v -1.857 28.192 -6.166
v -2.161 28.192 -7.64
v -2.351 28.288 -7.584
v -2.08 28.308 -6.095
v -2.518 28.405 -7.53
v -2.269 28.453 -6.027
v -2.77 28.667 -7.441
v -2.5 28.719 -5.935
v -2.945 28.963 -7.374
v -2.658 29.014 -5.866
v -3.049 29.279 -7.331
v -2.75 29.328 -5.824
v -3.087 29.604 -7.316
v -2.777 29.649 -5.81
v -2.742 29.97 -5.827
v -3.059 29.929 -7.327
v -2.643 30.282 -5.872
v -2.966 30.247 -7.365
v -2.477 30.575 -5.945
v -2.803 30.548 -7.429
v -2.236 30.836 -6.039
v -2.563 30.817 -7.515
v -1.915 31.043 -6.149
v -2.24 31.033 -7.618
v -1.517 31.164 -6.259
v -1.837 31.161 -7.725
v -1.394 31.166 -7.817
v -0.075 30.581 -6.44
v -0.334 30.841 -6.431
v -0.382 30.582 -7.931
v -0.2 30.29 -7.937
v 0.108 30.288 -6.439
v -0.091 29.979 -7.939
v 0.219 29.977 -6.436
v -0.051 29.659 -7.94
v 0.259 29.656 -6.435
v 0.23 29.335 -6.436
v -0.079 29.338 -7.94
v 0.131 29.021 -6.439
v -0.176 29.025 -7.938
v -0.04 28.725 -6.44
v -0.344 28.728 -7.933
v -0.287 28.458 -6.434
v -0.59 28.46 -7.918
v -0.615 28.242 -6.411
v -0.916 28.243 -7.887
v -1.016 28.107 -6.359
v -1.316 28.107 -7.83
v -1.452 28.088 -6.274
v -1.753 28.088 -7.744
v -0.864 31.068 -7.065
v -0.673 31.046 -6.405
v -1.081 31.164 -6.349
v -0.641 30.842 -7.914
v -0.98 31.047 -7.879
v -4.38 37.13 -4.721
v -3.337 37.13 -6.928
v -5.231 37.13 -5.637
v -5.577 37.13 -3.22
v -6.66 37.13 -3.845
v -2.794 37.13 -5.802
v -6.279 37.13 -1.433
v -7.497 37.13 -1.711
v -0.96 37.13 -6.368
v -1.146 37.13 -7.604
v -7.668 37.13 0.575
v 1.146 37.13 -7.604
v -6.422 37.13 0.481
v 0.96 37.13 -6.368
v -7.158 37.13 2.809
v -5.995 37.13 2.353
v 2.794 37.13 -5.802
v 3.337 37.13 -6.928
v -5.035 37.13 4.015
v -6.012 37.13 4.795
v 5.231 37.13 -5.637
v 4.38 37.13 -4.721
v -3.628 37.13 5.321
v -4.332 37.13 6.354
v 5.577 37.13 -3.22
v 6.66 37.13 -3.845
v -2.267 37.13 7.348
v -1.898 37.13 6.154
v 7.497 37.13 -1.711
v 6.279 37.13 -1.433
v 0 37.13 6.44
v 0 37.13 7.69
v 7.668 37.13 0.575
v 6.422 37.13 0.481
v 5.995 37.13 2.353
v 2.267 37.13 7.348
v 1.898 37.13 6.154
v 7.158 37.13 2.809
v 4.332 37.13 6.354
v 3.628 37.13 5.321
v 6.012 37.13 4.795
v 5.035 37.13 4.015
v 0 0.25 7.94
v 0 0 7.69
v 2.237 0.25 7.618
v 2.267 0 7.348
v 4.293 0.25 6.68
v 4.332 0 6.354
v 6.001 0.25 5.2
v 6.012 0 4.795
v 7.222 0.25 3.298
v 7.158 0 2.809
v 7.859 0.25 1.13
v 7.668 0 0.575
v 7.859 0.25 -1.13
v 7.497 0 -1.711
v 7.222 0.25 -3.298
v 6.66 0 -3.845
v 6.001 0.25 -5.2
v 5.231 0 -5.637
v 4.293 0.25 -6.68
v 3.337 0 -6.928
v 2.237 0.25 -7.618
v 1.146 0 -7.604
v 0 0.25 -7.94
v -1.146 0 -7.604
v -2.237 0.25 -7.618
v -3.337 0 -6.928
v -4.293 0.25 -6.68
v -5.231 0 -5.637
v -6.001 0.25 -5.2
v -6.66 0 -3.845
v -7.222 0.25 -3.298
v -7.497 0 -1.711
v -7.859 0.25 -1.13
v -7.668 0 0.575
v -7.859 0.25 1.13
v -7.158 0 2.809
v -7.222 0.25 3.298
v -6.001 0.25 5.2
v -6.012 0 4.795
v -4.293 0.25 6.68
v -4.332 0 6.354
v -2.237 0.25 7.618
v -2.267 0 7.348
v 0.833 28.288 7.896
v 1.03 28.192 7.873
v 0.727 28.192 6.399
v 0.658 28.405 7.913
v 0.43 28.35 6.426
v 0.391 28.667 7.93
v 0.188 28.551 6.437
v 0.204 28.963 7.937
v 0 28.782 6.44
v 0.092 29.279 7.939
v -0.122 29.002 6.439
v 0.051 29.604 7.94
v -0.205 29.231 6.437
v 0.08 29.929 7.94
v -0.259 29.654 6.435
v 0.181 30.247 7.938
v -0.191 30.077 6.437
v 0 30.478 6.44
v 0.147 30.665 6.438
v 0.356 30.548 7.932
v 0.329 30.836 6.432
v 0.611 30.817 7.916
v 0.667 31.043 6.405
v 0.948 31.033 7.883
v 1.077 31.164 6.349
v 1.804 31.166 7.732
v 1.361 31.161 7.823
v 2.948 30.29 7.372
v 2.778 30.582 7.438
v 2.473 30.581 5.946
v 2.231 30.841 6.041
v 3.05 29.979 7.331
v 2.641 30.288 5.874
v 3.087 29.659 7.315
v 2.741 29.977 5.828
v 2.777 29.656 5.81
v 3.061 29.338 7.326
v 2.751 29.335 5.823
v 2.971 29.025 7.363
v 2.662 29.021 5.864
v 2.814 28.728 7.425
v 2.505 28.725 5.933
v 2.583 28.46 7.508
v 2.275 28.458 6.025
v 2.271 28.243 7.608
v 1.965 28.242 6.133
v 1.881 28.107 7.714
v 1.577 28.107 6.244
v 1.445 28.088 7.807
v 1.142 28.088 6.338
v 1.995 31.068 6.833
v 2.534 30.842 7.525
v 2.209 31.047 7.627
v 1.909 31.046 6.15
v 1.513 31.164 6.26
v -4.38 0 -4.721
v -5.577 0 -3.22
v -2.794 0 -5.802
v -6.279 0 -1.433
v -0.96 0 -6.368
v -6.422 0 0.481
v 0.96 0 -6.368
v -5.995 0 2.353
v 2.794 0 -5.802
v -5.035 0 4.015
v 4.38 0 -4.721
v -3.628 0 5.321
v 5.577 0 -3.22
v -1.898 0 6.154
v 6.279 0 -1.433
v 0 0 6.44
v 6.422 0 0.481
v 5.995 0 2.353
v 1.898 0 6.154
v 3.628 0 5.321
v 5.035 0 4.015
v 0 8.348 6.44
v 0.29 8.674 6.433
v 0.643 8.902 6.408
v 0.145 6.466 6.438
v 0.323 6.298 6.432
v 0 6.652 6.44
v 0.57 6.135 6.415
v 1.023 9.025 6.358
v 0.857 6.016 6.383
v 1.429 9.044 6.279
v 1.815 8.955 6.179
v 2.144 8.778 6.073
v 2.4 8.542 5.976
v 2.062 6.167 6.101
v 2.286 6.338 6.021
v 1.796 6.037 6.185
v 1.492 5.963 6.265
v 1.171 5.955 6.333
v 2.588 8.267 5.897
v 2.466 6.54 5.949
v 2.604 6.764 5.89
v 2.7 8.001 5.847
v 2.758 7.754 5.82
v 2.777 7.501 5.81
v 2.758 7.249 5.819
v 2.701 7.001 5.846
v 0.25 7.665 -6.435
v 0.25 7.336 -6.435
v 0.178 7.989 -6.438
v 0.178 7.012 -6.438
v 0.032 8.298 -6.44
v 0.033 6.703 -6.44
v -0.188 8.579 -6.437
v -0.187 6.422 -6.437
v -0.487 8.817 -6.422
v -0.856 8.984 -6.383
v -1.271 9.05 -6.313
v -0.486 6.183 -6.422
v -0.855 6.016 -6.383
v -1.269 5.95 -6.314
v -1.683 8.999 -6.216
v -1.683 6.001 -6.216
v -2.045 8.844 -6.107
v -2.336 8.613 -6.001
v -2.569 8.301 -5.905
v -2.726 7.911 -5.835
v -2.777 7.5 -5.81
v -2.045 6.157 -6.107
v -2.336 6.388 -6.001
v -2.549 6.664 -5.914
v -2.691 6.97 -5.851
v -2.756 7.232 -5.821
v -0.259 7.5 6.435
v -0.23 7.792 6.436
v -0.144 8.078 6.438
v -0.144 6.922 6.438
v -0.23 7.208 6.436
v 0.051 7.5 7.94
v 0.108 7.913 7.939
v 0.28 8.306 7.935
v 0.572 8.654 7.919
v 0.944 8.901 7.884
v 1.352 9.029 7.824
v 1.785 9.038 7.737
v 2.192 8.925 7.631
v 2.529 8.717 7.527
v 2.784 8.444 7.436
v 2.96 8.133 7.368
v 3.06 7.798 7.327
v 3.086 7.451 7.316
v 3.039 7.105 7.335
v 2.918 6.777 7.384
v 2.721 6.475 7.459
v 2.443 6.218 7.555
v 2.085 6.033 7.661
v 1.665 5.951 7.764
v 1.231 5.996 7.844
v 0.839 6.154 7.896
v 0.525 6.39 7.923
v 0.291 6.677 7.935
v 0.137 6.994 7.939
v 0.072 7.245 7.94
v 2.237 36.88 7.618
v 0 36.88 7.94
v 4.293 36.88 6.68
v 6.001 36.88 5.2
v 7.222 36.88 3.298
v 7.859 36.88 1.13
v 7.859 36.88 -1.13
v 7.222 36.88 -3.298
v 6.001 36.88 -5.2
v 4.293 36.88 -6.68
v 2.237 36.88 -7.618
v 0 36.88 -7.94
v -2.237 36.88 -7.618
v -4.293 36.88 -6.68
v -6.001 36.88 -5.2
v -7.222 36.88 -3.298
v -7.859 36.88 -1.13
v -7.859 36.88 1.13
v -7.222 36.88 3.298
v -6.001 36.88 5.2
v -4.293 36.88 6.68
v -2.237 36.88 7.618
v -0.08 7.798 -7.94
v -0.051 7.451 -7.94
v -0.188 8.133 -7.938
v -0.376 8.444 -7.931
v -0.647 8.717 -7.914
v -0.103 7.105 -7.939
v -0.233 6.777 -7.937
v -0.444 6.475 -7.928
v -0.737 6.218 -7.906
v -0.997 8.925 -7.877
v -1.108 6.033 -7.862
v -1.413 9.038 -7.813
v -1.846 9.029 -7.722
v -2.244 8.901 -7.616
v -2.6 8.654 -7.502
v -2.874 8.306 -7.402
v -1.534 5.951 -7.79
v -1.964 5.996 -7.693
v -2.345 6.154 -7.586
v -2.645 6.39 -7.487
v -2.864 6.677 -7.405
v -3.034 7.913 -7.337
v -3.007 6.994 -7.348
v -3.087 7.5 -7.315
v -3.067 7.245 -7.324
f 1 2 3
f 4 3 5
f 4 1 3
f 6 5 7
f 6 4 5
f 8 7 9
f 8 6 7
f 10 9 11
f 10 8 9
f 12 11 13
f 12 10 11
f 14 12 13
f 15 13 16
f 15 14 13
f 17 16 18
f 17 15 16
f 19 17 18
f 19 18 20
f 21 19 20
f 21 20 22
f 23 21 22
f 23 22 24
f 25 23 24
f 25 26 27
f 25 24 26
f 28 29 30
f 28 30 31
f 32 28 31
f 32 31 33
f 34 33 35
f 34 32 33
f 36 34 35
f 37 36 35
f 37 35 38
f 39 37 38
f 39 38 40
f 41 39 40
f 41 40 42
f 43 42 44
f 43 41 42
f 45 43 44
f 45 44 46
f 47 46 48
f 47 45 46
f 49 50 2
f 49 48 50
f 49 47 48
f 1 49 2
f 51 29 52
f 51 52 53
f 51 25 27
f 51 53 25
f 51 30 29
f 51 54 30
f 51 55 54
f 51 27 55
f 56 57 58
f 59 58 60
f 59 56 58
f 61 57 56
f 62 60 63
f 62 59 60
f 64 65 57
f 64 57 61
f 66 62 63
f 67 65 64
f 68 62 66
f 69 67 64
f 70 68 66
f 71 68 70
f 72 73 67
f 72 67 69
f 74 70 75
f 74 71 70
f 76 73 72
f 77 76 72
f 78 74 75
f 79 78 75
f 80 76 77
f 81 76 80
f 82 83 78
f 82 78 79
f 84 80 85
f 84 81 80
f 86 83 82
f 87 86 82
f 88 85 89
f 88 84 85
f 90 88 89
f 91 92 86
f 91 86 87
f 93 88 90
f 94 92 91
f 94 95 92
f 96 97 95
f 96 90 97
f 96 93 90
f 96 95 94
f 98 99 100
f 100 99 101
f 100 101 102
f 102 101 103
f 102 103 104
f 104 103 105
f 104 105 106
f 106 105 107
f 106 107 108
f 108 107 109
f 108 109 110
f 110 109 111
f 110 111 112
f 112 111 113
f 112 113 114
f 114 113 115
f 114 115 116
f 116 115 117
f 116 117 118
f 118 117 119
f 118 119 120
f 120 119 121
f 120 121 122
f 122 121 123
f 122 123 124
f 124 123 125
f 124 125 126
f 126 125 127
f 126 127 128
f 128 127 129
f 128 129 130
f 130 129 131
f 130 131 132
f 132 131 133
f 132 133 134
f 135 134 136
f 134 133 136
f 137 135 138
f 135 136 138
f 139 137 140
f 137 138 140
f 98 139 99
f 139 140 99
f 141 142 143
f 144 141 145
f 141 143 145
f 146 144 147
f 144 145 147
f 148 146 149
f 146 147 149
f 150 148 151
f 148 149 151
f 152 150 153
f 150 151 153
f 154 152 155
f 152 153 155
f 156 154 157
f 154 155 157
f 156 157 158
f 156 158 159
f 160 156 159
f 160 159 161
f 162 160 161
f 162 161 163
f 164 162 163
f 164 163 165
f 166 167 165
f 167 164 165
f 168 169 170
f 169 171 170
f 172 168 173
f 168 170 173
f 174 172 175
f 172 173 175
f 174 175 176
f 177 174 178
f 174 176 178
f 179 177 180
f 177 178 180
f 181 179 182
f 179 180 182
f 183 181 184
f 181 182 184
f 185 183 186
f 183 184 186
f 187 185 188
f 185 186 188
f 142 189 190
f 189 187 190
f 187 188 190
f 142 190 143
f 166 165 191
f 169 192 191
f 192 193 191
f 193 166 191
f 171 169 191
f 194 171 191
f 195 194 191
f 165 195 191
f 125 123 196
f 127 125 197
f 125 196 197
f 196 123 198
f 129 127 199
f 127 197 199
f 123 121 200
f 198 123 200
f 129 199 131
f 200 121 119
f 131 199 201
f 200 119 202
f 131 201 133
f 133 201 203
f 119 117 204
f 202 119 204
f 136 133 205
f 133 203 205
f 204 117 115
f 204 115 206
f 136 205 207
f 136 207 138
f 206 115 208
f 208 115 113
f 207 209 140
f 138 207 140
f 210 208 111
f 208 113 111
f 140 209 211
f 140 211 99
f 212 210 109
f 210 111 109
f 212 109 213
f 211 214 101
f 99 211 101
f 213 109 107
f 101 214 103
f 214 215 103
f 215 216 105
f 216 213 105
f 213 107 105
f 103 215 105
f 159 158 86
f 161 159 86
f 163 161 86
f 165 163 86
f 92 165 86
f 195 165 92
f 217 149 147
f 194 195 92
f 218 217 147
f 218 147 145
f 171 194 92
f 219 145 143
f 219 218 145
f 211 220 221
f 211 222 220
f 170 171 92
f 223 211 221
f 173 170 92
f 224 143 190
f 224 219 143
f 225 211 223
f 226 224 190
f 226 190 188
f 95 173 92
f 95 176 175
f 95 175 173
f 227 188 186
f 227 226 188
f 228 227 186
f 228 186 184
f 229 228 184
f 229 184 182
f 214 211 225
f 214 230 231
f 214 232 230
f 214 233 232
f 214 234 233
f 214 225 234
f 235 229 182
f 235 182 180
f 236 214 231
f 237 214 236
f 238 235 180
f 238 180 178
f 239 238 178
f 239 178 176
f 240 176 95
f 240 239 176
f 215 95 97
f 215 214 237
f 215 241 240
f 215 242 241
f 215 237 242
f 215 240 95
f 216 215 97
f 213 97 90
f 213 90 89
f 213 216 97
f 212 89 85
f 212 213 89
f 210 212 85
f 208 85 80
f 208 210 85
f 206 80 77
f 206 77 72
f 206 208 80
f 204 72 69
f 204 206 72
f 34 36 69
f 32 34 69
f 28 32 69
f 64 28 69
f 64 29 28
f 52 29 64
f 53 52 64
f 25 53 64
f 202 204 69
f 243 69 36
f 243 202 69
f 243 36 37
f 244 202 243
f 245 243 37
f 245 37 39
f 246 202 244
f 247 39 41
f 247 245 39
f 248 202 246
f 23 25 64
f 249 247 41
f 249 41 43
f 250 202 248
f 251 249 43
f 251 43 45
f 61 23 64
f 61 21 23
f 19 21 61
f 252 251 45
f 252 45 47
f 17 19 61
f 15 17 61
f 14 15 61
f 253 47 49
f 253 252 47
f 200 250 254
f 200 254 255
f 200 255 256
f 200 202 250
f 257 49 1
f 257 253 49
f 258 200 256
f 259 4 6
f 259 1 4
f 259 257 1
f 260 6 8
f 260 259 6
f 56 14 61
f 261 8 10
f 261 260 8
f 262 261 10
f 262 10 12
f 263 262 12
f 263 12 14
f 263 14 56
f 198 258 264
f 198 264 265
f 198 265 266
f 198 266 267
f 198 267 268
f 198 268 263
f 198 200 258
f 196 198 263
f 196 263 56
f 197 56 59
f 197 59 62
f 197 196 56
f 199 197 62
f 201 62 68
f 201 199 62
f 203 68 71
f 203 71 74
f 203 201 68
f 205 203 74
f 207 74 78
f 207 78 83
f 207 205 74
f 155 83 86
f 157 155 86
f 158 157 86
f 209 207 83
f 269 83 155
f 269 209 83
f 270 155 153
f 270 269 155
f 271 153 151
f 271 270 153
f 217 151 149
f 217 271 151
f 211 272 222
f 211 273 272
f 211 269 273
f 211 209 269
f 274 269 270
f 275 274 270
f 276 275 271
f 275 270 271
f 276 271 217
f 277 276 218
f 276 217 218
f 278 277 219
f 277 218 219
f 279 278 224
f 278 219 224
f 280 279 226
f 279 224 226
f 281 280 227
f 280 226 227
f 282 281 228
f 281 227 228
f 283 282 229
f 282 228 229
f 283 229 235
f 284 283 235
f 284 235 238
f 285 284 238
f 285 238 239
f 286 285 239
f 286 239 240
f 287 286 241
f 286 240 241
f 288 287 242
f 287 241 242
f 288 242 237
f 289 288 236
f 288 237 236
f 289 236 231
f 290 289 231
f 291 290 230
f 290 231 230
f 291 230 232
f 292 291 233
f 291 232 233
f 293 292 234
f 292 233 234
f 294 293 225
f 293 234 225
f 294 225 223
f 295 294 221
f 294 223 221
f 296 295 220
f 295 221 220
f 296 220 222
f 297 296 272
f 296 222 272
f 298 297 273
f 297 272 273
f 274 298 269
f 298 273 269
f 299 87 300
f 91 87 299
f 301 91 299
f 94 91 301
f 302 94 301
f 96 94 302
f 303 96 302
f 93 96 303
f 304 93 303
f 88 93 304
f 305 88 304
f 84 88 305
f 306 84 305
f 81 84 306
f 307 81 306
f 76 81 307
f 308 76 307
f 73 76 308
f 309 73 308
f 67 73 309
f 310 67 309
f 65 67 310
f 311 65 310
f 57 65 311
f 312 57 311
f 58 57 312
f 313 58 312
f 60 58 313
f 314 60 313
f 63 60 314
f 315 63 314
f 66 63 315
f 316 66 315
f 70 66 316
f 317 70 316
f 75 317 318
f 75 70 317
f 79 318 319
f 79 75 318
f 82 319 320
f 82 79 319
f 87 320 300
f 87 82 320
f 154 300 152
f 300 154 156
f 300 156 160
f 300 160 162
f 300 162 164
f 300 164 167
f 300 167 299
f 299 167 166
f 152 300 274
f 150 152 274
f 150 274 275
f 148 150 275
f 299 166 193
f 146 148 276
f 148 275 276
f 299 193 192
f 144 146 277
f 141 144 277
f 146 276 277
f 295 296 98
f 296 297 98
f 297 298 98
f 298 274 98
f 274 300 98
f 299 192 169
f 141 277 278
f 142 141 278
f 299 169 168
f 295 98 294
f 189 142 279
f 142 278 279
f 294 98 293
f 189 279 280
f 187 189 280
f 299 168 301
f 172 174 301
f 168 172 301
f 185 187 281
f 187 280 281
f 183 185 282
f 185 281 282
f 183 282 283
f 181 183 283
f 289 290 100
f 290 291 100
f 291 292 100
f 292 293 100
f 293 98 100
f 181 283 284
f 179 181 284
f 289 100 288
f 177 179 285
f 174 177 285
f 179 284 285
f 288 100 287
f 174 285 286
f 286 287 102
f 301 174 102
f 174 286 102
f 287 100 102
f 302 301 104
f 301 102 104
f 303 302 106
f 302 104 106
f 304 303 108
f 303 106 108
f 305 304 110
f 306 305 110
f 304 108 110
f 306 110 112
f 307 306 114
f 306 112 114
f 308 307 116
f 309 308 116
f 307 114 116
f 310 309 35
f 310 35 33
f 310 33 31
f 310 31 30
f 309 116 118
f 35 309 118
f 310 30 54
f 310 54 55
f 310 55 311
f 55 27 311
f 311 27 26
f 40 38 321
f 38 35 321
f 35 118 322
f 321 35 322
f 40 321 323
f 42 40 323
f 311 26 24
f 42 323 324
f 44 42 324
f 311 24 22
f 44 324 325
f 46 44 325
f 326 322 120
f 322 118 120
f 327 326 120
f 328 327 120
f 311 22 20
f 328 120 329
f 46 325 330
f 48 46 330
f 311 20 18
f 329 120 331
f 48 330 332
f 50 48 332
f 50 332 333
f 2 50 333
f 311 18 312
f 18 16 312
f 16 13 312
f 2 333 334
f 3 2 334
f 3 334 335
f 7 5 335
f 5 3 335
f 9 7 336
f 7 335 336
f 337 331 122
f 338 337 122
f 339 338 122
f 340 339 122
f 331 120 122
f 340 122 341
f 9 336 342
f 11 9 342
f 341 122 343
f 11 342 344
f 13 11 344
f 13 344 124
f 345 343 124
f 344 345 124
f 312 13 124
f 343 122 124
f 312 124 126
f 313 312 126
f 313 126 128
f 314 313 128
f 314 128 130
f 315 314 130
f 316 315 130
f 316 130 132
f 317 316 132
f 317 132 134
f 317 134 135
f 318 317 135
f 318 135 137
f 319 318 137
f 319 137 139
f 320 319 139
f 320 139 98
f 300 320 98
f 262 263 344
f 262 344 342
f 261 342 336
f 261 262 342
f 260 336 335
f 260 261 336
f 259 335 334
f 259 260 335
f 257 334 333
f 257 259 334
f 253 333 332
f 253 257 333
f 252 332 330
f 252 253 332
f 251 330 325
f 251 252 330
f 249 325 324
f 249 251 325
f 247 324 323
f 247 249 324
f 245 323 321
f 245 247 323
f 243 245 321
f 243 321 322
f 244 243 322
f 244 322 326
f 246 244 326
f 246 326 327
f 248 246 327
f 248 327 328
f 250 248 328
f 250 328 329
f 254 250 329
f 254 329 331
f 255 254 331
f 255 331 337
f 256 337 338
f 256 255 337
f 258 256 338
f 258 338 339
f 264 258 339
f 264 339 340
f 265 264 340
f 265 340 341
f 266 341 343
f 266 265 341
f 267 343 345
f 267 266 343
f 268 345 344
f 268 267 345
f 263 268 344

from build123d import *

# Parameters (mm, degrees)
SKETCH1_R               = 7.94
SKETCH1_R_2             = 6.44
BOSS_EXTRUDE1_DEPTH     = 37.13
CHAMFER1_SIZE           = 0.25
SKETCH2_R               = 1.55
CUT_EXTRUDE1_DEPTH      = 41.603627037
CUT_EXTRUDE1_DEPTH_BACK = 41.603627037


with BuildPart() as part:
    # Sketch1 → Boss-Extrude1 (new body)
    with BuildSketch(Plane(origin=(0, 0, 0), x_dir=(1, 0, 0), z_dir=(0, 1, 0))):
        with Locations(Location((0, 0, 0), (0, 0, 270))):
            Circle(SKETCH1_R)
        with Locations(Location((0, 0, 0), (0, 0, 270))):
            Circle(SKETCH1_R_2, mode=Mode.SUBTRACT)
    extrude(amount=BOSS_EXTRUDE1_DEPTH)

    # Chamfer1
    chamfer1_edges = [part.edges().sort_by_distance(p)[0] for p in [
        (0, 0, -7.94),
        (0, 37.13, -7.94),
    ]]
    chamfer(chamfer1_edges, length=CHAMFER1_SIZE)

    # Sketch2 → Cut-Extrude1 (cut, two sides)
    with BuildSketch(Plane(origin=(-1.178494154, 0, -5.730065578), x_dir=(-0.9794983894003966, 0, 0.2014519922016887), z_dir=(-0.20145199220168866, 0, -0.9794983894003965))) as cut_extrude1_sk:
        with Locations((0, 7.5)):
            Circle(SKETCH2_R)
        with BuildLine():
            add(Edge.make_bspline(
                [(0.577058583, 28.191501993), (3.454054595, 29.346012251), (2.299544337, 32.223008265), (-0.577451675, 31.068498007), (-3.454447687, 29.913987749), (-2.29993743, 27.036991735), (0.577058583, 28.191501993)],
                knots=[0, 0, 0, 0, 0.5, 0.5, 0.5, 1, 1, 1, 1], degree=3, weights=[1, 0.333333333, 0.333333333, 1, 0.333333333, 0.333333333, 1]))
        make_face()
    extrude(amount=CUT_EXTRUDE1_DEPTH, mode=Mode.SUBTRACT)
    extrude(cut_extrude1_sk.sketch, amount=-CUT_EXTRUDE1_DEPTH_BACK, mode=Mode.SUBTRACT)


solid = part.part
